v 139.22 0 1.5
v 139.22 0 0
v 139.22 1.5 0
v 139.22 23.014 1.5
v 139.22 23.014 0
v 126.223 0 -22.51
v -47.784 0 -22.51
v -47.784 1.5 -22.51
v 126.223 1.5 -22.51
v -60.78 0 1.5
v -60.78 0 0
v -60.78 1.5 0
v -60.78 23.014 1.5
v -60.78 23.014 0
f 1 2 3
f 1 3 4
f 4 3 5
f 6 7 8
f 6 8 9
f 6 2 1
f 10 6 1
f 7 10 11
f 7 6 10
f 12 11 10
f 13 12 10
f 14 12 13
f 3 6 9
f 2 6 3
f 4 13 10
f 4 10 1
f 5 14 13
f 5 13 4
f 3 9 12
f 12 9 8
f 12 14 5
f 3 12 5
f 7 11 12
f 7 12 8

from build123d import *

# Parameters (mm, degrees)
SKETCH18_W          = 200
SKETCH18_H          = 23.014216905
BOSS_EXTRUDE4_DEPTH = 1.5
BOSS_EXTRUDE5_DEPTH = 1.5


with BuildPart() as part:
    # Sketch18 → Boss-Extrude4 (new body)
    with BuildSketch(Plane.XY):
        with Locations((39.219715871, 11.507108453)):
            Rectangle(SKETCH18_W, SKETCH18_H)
    extrude(amount=BOSS_EXTRUDE4_DEPTH)

    # Sketch16 → Boss-Extrude5 (add)
    with BuildSketch(Plane(origin=(0, 0, 0), x_dir=(1, 0, 0), z_dir=(0, 1, 0))):
        Polygon((-47.784100803, 22.510049826), (126.22317902, 22.510049826), (139.219715871, 0), (-60.780284129, 0), align=None)
    extrude(amount=BOSS_EXTRUDE5_DEPTH)


solid = part.part
